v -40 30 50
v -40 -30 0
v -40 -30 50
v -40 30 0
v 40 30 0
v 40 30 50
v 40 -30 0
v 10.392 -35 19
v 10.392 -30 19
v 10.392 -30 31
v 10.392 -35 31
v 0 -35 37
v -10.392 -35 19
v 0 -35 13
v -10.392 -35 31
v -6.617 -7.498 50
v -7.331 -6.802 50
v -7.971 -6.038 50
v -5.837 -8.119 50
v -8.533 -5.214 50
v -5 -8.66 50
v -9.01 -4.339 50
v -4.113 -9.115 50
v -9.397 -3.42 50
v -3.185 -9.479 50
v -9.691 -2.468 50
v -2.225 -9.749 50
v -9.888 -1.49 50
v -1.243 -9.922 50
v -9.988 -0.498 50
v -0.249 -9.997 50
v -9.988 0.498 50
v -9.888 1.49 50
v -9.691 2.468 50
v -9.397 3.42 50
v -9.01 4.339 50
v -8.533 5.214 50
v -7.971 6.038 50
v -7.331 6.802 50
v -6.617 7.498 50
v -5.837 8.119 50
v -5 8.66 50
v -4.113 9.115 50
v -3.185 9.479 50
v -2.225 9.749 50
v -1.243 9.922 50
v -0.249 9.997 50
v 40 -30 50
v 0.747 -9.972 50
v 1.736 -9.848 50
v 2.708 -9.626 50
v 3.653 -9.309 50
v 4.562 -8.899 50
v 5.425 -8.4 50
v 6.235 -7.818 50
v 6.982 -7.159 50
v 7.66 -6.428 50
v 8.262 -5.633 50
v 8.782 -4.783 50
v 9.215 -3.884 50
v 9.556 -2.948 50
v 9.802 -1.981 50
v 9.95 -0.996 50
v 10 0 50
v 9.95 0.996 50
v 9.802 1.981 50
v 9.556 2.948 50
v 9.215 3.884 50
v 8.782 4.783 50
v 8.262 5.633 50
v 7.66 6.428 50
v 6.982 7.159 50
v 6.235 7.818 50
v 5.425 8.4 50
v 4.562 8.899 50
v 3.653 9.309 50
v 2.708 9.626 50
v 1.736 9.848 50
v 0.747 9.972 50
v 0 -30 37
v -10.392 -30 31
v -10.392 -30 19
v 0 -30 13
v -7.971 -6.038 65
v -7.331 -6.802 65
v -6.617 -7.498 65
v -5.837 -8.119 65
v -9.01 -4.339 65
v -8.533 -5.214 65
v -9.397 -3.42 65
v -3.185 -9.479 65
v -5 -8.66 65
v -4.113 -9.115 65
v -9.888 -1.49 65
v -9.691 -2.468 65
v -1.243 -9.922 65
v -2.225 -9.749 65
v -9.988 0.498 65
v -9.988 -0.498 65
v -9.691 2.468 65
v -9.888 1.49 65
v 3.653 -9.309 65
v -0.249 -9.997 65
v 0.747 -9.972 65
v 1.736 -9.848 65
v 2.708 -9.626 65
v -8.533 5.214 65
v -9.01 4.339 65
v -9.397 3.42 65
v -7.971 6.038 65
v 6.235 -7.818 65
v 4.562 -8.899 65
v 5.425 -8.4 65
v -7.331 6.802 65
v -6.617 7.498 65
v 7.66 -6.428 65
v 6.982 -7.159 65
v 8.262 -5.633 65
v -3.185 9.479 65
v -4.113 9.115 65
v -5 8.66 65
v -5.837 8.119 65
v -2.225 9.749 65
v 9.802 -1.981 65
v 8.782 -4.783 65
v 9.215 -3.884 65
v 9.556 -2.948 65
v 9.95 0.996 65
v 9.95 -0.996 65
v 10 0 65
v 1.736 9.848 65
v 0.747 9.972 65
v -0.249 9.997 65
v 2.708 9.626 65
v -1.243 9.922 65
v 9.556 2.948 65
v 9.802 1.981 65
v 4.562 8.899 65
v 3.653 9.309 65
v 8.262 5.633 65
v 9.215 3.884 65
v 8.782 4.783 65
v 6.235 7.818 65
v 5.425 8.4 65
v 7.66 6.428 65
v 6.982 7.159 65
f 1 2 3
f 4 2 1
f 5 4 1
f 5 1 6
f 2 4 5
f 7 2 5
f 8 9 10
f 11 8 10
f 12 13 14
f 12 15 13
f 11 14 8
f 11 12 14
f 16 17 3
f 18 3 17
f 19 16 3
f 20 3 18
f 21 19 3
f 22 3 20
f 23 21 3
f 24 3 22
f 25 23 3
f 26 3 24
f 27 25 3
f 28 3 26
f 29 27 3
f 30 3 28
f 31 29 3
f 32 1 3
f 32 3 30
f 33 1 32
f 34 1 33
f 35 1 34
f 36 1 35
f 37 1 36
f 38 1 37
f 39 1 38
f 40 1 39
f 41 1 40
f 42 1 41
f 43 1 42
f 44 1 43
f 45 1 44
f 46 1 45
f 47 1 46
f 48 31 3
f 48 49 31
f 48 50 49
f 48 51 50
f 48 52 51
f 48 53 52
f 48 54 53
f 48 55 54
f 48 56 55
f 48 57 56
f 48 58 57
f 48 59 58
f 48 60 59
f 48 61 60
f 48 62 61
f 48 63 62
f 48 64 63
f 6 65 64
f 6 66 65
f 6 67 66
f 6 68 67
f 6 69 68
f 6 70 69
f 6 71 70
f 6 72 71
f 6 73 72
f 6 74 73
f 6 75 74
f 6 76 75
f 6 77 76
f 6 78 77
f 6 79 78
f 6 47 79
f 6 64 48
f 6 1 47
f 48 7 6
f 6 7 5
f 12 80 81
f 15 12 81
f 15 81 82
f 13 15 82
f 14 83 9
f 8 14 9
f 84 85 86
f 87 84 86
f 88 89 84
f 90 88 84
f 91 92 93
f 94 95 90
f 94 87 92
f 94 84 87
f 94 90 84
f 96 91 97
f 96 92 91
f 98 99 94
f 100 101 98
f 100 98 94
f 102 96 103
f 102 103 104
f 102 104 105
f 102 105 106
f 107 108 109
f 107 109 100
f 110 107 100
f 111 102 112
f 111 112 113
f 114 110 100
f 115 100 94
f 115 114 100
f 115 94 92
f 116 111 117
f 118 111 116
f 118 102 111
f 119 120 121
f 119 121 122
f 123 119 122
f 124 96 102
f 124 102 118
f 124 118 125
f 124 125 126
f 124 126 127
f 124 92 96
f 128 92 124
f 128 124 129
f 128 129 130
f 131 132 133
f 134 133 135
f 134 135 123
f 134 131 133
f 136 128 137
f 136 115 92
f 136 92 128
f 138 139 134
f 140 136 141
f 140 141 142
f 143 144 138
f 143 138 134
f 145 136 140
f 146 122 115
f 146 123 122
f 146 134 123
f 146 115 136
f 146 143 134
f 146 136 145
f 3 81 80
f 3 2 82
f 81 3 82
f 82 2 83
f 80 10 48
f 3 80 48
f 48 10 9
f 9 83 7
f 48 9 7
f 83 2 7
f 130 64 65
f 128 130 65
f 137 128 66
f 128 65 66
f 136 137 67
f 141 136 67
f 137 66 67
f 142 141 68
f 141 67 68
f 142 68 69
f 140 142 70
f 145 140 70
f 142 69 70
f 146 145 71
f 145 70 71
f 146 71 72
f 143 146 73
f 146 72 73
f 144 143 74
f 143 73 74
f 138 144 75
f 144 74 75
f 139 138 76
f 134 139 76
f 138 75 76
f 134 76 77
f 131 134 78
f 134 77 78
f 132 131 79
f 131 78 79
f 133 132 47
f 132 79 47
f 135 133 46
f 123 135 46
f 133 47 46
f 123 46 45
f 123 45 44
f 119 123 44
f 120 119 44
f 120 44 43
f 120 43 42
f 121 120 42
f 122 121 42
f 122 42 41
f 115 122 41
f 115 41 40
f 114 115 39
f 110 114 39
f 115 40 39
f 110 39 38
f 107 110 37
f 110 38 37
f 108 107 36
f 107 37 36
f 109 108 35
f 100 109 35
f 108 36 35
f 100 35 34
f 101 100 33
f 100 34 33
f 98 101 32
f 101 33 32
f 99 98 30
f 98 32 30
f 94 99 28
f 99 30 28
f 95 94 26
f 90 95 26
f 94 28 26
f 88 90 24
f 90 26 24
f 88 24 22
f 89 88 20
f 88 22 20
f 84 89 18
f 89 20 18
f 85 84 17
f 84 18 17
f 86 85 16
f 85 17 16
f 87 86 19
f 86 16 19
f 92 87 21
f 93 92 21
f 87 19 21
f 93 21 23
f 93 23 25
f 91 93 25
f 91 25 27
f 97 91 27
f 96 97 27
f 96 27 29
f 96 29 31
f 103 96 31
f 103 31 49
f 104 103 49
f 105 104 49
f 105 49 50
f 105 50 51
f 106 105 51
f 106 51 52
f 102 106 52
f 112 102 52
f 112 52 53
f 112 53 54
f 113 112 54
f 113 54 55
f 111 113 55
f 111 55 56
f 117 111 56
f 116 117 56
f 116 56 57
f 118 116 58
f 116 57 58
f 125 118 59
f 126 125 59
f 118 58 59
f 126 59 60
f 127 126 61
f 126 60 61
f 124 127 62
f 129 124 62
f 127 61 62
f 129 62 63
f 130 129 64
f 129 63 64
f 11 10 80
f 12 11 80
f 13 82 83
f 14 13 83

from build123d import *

# Parameters (mm, degrees)
F0_W     = 80
F0_H     = 60
F1_DEPTH = 50
F2_R     = 10
F3_DEPTH = 15
F5_DEPTH = 5


with BuildPart() as f1:
    # F0 (on Top) → F1 (new body)
    with BuildSketch(Plane.XY):
        Rectangle(F0_W, F0_H)
    extrude(amount=F1_DEPTH)

    # F2 (on face) → F3 (join)
    with BuildSketch(Plane.XY.offset(50)):
        Circle(F2_R)
    extrude(amount=F3_DEPTH)

    # F4 (on face) → F5 (join)
    with BuildSketch(Plane.XZ.offset(30)):
        Polygon((-10.392305, 19), (0, 13), (10.392305, 19), (10.392305, 31), (0, 37), (-10.392305, 31), align=None)
    extrude(amount=F5_DEPTH)


solid = f1.part
